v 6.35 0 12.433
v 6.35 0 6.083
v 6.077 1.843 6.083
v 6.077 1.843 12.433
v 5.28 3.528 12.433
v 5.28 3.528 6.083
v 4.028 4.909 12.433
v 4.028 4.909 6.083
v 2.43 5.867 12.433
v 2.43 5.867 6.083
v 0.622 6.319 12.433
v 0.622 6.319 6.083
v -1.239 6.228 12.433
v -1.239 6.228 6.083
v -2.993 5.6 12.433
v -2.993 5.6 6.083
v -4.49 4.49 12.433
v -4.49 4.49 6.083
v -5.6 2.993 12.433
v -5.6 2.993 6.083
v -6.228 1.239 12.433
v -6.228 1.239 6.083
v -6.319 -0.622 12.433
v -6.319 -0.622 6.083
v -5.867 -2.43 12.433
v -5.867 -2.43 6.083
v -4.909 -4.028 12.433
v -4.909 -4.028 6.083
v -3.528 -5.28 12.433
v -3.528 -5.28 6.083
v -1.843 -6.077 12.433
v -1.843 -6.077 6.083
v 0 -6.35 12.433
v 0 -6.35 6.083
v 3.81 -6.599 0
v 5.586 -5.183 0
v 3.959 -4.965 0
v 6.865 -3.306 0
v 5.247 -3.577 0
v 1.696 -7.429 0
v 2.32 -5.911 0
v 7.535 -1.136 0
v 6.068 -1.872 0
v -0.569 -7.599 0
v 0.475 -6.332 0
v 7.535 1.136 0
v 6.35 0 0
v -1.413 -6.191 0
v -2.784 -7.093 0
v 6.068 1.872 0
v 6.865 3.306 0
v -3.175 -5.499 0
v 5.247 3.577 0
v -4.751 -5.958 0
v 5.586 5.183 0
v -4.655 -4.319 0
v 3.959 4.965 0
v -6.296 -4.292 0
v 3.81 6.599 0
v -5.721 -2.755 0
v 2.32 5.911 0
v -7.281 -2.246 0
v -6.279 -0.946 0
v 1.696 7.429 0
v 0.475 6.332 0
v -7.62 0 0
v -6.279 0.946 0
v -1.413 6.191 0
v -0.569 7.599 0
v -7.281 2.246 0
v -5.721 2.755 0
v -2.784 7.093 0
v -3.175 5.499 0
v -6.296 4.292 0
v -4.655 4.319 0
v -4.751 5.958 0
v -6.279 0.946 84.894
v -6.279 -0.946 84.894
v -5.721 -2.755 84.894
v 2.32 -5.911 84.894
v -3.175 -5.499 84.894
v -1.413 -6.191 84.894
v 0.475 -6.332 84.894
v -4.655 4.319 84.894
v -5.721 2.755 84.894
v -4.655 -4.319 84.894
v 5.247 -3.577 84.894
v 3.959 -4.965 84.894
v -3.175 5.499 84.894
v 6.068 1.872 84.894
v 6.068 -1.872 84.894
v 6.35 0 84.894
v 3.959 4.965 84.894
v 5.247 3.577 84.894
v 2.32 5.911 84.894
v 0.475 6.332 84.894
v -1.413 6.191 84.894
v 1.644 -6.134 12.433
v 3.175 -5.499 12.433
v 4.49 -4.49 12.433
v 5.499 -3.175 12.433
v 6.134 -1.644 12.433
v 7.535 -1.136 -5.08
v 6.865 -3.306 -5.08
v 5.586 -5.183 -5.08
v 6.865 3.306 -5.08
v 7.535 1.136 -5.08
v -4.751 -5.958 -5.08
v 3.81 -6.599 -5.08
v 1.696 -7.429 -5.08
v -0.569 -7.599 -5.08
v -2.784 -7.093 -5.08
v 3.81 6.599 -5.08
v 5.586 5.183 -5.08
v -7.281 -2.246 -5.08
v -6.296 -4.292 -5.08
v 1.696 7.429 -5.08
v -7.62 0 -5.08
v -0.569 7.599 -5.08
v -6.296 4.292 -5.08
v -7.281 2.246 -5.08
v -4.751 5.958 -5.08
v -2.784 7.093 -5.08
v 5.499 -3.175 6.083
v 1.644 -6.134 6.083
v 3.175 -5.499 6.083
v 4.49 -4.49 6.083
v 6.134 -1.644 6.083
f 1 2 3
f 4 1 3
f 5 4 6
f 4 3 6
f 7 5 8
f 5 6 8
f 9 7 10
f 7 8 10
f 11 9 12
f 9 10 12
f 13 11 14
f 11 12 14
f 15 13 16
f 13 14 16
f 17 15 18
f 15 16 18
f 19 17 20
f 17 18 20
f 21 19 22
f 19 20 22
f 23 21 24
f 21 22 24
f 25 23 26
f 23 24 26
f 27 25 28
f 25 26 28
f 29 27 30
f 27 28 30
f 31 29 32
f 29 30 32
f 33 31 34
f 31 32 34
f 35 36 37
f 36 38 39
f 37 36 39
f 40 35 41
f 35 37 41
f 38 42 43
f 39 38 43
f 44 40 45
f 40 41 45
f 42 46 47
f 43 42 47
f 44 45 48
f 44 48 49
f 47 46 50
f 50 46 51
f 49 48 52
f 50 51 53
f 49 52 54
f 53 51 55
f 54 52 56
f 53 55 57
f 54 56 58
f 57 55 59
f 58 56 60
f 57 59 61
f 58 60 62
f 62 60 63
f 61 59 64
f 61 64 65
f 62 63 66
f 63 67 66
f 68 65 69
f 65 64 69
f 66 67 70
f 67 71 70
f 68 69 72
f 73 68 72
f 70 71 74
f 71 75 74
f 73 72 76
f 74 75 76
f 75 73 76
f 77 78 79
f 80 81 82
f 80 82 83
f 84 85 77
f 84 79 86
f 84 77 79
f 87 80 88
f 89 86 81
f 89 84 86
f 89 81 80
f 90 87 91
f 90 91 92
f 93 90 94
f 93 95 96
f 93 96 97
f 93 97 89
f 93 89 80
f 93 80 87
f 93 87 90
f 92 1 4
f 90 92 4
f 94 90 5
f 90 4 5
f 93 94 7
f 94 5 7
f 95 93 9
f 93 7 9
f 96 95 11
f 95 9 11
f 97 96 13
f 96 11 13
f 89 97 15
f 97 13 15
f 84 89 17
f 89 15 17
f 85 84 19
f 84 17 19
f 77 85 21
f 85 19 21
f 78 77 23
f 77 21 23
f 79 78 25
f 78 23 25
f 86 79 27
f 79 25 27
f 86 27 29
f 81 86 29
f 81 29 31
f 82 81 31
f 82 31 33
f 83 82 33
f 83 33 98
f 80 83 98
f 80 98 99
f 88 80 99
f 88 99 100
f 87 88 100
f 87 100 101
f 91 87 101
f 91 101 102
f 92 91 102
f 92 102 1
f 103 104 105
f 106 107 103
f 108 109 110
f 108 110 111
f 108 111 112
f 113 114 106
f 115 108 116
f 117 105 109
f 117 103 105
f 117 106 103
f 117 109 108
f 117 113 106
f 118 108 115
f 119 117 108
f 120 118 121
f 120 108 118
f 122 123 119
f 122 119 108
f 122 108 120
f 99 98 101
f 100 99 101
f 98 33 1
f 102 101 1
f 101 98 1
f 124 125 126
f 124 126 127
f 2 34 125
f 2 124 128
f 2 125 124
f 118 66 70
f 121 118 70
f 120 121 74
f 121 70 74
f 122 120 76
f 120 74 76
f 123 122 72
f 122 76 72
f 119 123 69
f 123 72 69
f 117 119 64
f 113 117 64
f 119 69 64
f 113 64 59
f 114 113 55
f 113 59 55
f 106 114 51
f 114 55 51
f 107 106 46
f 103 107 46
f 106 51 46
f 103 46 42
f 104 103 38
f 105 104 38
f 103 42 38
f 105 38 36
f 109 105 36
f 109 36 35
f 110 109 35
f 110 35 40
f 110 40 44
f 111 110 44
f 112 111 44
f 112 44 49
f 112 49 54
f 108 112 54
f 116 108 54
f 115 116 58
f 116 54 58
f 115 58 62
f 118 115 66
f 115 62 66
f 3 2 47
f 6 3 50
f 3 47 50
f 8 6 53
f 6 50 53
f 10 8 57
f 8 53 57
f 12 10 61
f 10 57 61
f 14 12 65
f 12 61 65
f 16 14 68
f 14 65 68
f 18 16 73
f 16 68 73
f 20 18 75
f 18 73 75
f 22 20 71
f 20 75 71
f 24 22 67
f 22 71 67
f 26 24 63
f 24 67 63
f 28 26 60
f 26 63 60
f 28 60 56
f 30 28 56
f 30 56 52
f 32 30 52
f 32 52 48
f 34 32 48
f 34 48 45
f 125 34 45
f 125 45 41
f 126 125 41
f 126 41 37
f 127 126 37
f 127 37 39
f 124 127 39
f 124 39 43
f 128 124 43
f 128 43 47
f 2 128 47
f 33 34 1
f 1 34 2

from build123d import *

# Parameters (mm, degrees)
SKETCH1_R           = 6.35
BOSS_EXTRUDE1_DEPTH = 6.0833
SKETCH4_R           = 7.62
BOSS_EXTRUDE2_DEPTH = 5.08
BOSS_EXTRUDE3_DEPTH = 6.35
SKETCH13_R          = 6.35
BOSS_EXTRUDE4_DEPTH = 72.46112


with BuildPart() as part:
    # Sketch1 → Boss-Extrude1 (new body)
    with BuildSketch(Plane.XY):
        Circle(SKETCH1_R)
    extrude(amount=BOSS_EXTRUDE1_DEPTH)

    # Sketch4 → Boss-Extrude2 (add)
    with BuildSketch(Plane(origin=(0, 0, 0), x_dir=(-1, 0, 0), z_dir=(0, 0, -1))):
        Circle(SKETCH4_R)
    extrude(amount=BOSS_EXTRUDE2_DEPTH)

    # Sketch12 → Boss-Extrude3 (add)
    with BuildSketch(Plane.XY.offset(6.0833)):
        with BuildLine():
            Line((0, -6.35), (6.35, 0))
            ThreePointArc((6.35, 0), (-4.490128061, 4.490128061), (0, -6.35))
        make_face()
    extrude(amount=BOSS_EXTRUDE3_DEPTH)

    # Sketch13 → Boss-Extrude4 (add)
    with BuildSketch(Plane.XY.offset(12.4333)):
        Circle(SKETCH13_R)
    extrude(amount=BOSS_EXTRUDE4_DEPTH)


solid = part.part
